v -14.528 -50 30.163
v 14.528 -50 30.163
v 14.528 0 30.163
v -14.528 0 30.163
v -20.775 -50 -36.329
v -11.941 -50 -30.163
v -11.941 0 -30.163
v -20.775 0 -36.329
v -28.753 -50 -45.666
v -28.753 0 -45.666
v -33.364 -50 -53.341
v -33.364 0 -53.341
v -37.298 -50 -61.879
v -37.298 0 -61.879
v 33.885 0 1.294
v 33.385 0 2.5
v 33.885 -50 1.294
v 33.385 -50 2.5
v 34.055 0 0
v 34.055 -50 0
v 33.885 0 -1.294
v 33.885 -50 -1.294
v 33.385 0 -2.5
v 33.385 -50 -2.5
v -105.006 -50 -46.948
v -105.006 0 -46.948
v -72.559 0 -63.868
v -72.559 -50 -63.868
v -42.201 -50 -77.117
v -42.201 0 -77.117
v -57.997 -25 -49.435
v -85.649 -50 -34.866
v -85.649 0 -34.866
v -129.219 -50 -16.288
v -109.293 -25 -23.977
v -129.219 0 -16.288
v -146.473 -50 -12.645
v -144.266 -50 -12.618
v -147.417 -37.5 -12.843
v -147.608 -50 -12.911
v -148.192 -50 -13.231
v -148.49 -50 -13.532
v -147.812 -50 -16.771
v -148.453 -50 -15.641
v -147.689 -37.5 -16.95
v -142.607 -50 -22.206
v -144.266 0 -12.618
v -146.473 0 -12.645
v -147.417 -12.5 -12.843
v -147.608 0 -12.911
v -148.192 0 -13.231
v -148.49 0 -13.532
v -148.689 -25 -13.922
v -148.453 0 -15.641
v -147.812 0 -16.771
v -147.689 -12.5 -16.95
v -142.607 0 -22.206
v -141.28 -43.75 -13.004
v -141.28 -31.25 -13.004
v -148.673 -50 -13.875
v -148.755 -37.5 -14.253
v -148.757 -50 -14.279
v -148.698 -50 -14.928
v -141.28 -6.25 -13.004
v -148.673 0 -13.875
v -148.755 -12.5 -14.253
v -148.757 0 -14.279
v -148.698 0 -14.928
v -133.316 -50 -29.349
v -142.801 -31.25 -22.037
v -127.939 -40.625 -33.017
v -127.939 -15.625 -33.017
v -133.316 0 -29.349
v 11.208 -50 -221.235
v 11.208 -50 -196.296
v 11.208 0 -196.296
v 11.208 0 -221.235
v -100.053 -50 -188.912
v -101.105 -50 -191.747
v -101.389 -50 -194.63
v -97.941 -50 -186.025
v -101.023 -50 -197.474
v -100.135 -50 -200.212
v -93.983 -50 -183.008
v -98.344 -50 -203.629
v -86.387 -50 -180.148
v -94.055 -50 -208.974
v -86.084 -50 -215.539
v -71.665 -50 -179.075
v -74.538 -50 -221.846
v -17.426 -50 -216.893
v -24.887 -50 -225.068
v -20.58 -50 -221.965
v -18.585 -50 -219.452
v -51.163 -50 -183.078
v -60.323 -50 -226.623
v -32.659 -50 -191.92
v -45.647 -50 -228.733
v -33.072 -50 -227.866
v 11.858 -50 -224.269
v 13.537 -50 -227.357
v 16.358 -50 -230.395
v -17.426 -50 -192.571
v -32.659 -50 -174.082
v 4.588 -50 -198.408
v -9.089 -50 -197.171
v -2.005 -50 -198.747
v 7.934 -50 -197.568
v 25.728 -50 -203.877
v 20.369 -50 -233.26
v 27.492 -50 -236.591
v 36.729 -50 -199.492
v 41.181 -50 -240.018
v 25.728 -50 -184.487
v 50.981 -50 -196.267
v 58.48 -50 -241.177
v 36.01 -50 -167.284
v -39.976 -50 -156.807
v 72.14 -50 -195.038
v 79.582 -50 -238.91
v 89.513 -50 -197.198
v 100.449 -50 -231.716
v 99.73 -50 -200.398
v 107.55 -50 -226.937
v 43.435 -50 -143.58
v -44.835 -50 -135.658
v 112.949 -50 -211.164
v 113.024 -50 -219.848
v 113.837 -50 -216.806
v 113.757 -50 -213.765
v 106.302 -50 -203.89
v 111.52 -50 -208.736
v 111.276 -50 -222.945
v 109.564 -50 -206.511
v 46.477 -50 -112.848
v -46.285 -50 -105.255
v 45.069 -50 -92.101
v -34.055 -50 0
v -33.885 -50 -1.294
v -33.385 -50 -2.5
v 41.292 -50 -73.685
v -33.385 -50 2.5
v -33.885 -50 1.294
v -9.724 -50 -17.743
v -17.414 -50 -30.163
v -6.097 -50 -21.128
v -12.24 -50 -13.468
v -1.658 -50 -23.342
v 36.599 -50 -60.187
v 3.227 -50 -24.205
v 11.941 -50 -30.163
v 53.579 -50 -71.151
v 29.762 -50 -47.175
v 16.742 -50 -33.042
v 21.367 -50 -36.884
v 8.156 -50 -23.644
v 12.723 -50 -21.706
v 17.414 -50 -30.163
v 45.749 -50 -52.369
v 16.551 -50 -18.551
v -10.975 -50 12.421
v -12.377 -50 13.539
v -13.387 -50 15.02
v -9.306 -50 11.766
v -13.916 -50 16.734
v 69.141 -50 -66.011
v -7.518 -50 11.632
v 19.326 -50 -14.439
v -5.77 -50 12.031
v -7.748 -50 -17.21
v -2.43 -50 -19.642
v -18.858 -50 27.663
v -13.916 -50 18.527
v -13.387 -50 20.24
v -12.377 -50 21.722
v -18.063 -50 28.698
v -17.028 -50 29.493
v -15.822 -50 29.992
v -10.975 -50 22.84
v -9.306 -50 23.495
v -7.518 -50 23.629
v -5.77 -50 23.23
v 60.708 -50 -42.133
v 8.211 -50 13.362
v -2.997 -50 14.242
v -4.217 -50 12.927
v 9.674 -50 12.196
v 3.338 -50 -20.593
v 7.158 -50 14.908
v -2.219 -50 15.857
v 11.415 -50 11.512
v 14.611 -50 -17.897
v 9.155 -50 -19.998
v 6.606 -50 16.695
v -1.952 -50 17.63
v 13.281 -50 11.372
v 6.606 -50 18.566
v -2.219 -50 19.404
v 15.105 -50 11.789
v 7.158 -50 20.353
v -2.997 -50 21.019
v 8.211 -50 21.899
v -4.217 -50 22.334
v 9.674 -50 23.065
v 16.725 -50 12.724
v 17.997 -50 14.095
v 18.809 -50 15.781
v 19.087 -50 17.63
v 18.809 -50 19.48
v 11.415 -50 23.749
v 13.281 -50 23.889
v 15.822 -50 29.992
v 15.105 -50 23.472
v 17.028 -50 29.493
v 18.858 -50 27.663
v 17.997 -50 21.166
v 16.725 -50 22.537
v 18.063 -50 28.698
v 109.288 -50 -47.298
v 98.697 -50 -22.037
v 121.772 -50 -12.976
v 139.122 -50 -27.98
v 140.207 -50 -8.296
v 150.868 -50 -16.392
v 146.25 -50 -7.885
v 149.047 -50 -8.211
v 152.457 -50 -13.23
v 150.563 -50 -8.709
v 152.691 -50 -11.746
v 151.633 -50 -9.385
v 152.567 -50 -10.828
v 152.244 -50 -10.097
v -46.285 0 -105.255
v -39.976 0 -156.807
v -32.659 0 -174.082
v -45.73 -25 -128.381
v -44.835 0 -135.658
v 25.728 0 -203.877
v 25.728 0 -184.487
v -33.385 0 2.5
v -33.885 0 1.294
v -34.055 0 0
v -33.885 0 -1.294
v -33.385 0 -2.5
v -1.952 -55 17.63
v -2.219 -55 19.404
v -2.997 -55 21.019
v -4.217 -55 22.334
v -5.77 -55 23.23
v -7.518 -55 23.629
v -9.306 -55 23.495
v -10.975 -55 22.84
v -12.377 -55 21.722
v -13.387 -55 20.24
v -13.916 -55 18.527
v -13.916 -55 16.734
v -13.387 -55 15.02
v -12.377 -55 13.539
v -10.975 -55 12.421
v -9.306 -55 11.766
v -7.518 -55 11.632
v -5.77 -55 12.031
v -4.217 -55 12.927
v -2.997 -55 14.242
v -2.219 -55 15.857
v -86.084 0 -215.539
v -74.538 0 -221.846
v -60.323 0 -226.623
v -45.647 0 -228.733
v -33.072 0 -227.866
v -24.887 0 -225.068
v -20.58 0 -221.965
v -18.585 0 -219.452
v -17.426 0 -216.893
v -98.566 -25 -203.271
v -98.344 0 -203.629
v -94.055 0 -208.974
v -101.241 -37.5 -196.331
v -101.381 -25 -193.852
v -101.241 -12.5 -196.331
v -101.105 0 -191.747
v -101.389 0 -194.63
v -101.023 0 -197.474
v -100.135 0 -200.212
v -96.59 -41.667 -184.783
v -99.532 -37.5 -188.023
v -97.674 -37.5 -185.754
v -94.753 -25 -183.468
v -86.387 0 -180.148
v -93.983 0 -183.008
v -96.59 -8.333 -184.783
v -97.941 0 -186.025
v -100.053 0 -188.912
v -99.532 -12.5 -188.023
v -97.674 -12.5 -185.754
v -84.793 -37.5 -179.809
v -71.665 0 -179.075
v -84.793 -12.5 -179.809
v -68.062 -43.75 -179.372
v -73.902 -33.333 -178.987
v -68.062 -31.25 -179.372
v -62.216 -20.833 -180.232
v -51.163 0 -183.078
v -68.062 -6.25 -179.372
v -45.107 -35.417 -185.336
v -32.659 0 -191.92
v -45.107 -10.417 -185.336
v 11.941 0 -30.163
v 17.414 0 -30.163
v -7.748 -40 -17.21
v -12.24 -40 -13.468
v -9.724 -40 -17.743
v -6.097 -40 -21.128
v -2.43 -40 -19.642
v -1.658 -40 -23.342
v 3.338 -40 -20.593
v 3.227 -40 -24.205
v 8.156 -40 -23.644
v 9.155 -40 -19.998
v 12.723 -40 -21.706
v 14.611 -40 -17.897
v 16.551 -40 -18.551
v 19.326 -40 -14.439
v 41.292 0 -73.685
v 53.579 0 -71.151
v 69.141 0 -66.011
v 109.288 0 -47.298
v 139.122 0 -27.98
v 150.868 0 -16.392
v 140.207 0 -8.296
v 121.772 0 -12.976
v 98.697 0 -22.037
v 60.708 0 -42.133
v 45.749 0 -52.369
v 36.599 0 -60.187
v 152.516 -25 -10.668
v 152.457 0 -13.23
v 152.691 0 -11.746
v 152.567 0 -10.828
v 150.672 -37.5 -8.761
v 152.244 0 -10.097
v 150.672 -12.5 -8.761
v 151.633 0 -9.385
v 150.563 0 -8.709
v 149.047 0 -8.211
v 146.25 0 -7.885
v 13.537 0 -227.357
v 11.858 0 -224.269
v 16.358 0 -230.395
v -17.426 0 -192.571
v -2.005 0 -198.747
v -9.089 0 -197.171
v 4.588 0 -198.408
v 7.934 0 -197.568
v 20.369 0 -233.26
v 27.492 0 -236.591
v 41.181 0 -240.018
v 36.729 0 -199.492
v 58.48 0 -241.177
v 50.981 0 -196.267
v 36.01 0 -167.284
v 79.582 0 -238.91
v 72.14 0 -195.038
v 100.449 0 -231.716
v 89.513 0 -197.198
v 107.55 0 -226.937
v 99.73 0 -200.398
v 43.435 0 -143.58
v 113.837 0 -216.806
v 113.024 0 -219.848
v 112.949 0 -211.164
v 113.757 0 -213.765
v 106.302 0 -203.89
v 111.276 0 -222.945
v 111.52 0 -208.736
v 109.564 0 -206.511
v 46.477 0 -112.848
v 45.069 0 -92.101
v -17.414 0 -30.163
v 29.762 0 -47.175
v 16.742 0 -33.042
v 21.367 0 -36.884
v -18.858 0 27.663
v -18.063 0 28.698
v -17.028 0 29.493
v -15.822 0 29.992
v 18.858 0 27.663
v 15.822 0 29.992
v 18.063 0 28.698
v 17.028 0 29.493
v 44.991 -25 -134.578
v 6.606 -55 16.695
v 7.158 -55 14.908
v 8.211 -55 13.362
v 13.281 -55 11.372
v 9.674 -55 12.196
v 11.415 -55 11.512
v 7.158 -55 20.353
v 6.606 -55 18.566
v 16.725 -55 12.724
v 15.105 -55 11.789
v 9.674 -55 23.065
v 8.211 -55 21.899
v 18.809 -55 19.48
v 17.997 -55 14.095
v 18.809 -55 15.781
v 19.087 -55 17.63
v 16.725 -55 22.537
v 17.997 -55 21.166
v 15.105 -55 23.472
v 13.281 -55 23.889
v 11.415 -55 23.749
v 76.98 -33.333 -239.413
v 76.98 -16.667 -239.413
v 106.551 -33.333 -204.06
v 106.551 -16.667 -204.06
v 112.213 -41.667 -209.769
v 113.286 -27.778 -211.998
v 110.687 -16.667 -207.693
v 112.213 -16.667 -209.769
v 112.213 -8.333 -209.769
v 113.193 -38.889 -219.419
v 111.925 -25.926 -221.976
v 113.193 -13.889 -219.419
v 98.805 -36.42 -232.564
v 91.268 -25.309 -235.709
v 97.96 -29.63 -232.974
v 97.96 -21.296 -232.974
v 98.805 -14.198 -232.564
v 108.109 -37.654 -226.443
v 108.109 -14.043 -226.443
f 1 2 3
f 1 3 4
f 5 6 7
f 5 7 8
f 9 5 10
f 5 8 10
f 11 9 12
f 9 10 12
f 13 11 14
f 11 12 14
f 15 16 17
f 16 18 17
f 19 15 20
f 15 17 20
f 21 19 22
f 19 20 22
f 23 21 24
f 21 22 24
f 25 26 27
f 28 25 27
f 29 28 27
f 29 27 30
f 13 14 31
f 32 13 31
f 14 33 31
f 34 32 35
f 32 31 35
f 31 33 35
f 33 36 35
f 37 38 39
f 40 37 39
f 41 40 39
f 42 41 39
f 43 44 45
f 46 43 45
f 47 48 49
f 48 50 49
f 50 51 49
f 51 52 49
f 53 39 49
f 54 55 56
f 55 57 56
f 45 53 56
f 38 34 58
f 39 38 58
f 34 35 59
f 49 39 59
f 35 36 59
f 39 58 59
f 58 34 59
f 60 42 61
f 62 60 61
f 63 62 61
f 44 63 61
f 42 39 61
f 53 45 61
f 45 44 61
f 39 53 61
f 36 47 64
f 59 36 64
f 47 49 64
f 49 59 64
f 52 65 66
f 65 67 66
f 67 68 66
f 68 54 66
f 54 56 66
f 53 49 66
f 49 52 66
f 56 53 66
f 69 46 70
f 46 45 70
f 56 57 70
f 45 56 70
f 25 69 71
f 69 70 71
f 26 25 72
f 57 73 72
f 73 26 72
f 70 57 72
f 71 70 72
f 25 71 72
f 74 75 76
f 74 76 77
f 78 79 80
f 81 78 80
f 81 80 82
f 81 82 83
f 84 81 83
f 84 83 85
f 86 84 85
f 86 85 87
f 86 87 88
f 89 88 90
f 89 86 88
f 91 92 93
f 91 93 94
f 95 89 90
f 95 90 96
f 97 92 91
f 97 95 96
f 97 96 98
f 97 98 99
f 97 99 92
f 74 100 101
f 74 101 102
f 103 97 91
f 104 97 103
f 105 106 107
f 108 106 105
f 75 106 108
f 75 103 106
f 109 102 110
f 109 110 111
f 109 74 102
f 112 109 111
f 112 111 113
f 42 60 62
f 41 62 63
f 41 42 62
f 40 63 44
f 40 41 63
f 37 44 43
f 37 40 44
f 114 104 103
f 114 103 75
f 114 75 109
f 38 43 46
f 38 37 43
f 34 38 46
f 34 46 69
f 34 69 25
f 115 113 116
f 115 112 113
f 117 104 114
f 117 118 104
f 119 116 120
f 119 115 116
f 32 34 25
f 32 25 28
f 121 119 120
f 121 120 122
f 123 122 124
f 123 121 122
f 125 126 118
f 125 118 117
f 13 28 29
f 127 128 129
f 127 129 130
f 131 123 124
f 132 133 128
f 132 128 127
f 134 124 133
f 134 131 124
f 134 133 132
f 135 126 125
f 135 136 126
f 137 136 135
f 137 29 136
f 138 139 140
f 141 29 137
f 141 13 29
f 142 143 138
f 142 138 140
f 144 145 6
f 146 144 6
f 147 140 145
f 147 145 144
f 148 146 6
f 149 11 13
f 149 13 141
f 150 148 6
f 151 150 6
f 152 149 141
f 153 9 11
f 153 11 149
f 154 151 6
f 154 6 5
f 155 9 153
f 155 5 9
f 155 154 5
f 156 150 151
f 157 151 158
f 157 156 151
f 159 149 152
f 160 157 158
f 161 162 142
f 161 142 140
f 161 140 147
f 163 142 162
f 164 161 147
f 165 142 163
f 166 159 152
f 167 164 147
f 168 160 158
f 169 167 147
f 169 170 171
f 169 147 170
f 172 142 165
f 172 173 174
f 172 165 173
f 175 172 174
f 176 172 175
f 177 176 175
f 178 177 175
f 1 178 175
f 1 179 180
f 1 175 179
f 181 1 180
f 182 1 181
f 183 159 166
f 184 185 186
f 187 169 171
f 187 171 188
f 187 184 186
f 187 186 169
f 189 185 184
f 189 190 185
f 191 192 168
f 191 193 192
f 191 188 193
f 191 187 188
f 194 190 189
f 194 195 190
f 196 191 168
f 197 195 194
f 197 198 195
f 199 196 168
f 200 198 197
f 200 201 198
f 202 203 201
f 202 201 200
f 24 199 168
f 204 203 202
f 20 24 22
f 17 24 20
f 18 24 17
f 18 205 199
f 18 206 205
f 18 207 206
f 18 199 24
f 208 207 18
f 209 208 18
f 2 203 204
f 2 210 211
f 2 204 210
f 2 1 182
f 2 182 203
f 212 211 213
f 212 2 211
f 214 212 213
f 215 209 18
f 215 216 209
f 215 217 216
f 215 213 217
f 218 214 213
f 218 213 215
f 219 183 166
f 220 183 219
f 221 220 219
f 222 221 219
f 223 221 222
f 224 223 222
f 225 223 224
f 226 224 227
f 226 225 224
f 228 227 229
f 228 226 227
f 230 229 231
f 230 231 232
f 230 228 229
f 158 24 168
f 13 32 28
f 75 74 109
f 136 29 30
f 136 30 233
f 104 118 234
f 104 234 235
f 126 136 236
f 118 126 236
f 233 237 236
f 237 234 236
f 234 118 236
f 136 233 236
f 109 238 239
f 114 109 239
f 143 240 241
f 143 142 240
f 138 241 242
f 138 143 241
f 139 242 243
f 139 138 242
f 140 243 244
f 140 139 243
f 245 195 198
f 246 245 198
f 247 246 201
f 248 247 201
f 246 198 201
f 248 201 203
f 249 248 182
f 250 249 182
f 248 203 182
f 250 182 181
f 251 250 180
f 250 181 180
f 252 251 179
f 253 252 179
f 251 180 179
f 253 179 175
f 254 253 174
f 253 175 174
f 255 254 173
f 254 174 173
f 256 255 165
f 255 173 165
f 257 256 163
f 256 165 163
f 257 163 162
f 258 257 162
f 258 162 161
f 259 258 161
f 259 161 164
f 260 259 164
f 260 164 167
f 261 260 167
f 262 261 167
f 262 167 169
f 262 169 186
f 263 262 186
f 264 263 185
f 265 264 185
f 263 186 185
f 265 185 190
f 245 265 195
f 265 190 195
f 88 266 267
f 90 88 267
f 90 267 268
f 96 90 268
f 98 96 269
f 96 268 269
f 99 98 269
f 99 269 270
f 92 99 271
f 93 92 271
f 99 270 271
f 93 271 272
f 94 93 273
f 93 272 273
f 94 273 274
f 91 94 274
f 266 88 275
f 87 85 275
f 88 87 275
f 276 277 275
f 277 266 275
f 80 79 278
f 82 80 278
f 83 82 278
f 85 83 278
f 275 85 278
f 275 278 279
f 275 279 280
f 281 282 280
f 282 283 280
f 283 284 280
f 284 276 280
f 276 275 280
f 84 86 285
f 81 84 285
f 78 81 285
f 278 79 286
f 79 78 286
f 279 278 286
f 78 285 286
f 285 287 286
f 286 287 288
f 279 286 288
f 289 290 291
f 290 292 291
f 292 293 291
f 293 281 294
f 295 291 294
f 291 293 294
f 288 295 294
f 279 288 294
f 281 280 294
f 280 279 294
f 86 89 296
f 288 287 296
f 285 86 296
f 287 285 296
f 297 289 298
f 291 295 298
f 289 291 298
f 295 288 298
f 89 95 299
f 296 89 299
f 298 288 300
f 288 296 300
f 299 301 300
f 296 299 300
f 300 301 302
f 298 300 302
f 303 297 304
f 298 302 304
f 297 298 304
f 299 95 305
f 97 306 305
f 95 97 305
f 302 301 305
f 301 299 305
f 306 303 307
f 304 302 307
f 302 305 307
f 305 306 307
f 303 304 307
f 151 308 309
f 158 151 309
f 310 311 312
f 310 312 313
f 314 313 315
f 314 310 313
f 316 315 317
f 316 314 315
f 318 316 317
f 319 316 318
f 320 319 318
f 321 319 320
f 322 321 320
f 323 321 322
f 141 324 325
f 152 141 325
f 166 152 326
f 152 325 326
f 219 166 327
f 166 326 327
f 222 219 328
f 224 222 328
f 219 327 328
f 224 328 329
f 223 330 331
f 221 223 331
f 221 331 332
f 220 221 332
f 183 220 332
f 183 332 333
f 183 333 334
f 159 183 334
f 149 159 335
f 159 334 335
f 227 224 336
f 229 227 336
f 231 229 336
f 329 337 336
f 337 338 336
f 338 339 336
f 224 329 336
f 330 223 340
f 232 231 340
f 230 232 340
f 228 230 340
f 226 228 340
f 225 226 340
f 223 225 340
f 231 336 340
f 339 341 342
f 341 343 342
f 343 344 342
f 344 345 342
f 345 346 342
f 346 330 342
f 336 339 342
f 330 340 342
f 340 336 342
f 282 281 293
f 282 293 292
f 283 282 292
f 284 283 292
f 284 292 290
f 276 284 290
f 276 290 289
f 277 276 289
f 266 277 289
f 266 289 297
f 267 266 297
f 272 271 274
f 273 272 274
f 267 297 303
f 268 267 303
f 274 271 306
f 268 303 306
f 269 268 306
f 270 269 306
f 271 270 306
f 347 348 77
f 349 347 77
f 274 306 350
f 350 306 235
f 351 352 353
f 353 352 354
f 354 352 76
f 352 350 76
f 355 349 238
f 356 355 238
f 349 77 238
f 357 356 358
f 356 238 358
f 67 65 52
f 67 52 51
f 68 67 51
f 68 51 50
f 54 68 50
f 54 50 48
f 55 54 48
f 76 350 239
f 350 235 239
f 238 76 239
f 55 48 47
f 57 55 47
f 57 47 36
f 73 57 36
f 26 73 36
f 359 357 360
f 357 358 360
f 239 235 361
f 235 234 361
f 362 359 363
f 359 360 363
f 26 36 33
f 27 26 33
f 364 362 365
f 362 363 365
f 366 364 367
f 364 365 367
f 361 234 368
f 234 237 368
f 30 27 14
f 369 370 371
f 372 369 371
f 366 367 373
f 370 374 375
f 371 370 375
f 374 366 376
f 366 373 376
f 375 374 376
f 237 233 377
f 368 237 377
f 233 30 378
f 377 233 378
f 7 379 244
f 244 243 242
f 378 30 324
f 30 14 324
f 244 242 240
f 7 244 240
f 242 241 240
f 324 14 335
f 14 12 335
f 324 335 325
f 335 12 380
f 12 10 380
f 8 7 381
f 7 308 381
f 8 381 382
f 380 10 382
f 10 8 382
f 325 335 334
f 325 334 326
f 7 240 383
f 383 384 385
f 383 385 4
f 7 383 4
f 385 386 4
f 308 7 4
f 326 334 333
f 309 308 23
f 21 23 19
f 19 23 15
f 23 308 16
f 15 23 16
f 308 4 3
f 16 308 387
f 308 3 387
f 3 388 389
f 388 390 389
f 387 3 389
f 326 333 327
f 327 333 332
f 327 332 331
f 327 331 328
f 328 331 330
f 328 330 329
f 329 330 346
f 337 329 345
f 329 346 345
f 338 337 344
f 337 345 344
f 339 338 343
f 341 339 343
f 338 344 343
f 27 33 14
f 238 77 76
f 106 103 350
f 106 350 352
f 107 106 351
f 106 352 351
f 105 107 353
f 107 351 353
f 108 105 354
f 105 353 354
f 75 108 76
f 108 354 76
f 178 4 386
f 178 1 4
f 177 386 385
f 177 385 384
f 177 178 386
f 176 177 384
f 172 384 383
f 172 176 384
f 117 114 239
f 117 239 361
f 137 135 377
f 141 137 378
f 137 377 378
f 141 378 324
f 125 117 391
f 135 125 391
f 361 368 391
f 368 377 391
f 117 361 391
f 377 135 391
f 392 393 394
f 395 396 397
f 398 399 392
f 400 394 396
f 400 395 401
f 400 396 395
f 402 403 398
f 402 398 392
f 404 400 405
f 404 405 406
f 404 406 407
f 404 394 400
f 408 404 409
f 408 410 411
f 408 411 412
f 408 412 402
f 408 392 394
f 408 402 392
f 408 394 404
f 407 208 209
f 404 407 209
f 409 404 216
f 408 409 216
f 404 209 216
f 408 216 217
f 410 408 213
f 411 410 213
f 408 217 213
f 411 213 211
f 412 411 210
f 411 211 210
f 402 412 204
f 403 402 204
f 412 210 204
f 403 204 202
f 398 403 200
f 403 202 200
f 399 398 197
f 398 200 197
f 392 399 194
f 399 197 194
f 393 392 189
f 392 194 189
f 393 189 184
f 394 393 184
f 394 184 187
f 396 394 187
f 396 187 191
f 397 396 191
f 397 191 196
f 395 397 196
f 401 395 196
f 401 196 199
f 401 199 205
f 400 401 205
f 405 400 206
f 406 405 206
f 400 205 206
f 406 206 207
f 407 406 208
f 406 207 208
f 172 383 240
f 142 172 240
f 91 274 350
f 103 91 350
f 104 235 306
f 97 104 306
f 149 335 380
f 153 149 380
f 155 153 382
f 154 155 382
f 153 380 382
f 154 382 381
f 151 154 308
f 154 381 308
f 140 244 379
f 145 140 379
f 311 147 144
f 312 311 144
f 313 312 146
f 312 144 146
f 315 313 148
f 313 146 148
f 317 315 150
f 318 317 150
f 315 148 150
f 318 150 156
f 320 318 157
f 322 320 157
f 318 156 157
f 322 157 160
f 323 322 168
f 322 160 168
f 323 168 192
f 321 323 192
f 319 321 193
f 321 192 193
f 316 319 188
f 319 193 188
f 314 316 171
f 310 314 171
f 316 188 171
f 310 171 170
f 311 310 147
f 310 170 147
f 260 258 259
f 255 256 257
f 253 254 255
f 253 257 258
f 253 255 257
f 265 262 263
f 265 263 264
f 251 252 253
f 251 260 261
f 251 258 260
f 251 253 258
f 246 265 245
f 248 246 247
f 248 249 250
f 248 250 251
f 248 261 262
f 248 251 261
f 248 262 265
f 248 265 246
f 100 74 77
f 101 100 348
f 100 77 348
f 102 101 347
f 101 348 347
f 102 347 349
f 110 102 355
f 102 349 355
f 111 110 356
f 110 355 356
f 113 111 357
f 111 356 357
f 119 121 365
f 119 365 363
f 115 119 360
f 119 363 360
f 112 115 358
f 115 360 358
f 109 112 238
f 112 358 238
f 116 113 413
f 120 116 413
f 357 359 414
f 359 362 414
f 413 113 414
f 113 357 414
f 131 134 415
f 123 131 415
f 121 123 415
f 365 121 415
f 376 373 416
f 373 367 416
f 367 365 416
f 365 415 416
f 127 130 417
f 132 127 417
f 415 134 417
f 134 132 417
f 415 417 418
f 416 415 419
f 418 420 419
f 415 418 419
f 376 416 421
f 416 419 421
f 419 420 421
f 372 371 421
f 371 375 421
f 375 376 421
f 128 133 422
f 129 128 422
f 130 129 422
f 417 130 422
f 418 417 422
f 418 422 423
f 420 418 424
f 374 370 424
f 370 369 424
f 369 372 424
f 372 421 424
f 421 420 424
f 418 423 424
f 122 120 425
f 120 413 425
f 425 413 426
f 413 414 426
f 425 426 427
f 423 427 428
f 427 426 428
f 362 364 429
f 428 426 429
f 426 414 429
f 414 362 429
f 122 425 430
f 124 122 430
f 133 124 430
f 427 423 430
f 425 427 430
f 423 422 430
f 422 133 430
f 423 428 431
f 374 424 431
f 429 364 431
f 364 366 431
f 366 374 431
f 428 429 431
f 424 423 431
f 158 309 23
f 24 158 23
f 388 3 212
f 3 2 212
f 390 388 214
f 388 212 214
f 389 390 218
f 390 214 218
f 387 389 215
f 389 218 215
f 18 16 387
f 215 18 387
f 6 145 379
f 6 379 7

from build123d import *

# Parameters (mm, degrees)
F1_DEPTH = 50
F2_R     = 6.0155907658
F2_R_2   = 6.2756136539
F3_DEPTH = 5
F4_DEPTH = 10
F5_R     = 5
F7_DEPTH = 50


with BuildPart() as f1:
    # F0 (on Front) → F1 (new body)
    with BuildSketch(Plane.XZ):
        Polygon((17.4143397291, 30.1625211911), (-17.4143397291, 30.1625211911), (-34.8286794583, 0), (-17.4143397291, -30.1625211911), (17.4143397291, -30.1625211911), (34.8286794583, 0), align=None)
    extrude(amount=F1_DEPTH)

    # F2 (on face) → F3 (join)
    with BuildSketch(Plane.XZ.offset(50)):
        with Locations((-7.967392914, 17.6304206252)):
            Circle(F2_R)
        with Locations((12.811797671, 17.6304578781)):
            Circle(F2_R_2)
    extrude(amount=F3_DEPTH)

    # F2 (on face) → F4 (cut)
    with BuildSketch(Plane.XZ.offset(50)):
        with BuildLine():
            ThreePointArc((19.3255450577, -14.4387213513), (3.3384184901, -20.5933298221), (-12.2403670102, -13.468102552))
            ThreePointArc((-12.2403670102, -13.468102552), (3.2273641474, -24.2049759369), (19.3255450577, -14.4387213513))
        make_face()
    extrude(amount=-F4_DEPTH, mode=Mode.SUBTRACT)

    # F5
    f5_edges = [f1.edges().sort_by_distance(p)[0] for p in [
        (17.41434, -25, 30.162521),
        (-17.41434, -25, 30.162521),
        (34.828679, -25, 0),
        (-34.828679, -25, 0),
    ]]
    fillet(f5_edges, radius=F5_R)

    # F6 (on Front) → F7 (join)
    with BuildSketch(Plane.XZ):
        with BuildLine():
            add(Edge.make_bspline(
                [(41.2922416881, -73.6853662735), (169.4693590378, -59.4246752204), (152.5160927466, -10.667922077), (135.5628264553, 38.0888310665), (36.5988004625, -60.1872620557)],
                knots=[0.5054493336, 0.5054493336, 0.5054493336, 3.1146139618, 3.1146139618, 5.7237785899, 5.7237785899, 5.7237785899], degree=2, weights=[1, 0.2630807094, 1, 0.2630807094, 1]))
            add(Edge.make_bspline(
                [(41.2922416881, -73.6853662735), (39.2889405165, -66.529639937), (36.5988004625, -60.1872620557)],
                knots=[5.1892655065, 5.1892655065, 5.1892655065, 5.376524204, 5.376524204, 5.376524204], degree=2, weights=[1, 0.9956199737, 1]))
        make_face()
        with BuildLine():
            add(Edge.make_bspline(
                [(-37.2982655111, -61.8791791625), (-40.1784962307, -69.0282916237), (-42.20112137, -77.1171546989)],
                knots=[0.9314728887, 0.9314728887, 0.9314728887, 1.1384572321, 1.1384572321, 1.1384572321], degree=2, weights=[1, 0.9946494634, 1]))
            add(Edge.make_bspline(
                [(-37.2982655111, -61.8791791625), (-142.2676835981, 6.0363373075), (-148.6893936246, -13.9222058565), (-155.1111036512, -33.8807490205), (-42.20112137, -77.1171546989)],
                knots=[0.9261808498, 0.9261808498, 0.9261808498, 3.1635032717, 3.1635032717, 5.4008256936, 5.4008256936, 5.4008256936], degree=2, weights=[1, 0.4368871001, 1, 0.4368871001, 1]))
        make_face()
        with BuildLine():
            add(Edge.make_bspline(
                [(36.5988004625, -60.1872620557), (22.6424707083, -27.2832810879), (0, -27.2832810879)],
                knots=[5.376524204, 5.376524204, 5.376524204, 6.2831853072, 6.2831853072, 6.2831853072], degree=2, weights=[1, 0.8989934357, 1]))
            add(Edge.make_bspline(
                [(0, -27.2832810879), (-23.3602880424, -27.2832810879), (-37.2982655111, -61.8791791625)],
                knots=[0, 0, 0, 0.9314728887, 0.9314728887, 0.9314728887], degree=2, weights=[1, 0.8934910848, 1]))
            add(Edge.make_bspline(
                [(-14.1357605669, -82.8124405083), (-11.8424071187, -78.3491930143), (-37.2982655111, -61.8791791625)],
                knots=[0, 0, 0, 0.9261808498, 0.9261808498, 0.9261808498], degree=2, weights=[1, 0.8946762325, 1]))
            add(Edge.make_bspline(
                [(-42.20112137, -77.1171546989), (-16.3047277649, -87.0336116578), (-14.1357605669, -82.8124405083)],
                knots=[5.4008256936, 5.4008256936, 5.4008256936, 6.2831853072, 6.2831853072, 6.2831853072], degree=2, weights=[1, 0.9042485074, 1]))
            add(Edge.make_bspline(
                [(-42.20112137, -77.1171546989), (-55.8693379467, -131.7789554553), (-32.6593779027, -174.0816324883)],
                knots=[1.1384572321, 1.1384572321, 1.1384572321, 2.3624206627, 2.3624206627, 2.3624206627], degree=2, weights=[1, 0.8185111489, 1]))
            Line((-32.6593779027, -174.0816324883), (-32.6593779027, -169.5833057165))
            Line((-32.6593779027, -169.5833057165), (-17.4256470054, -169.5833057165))
            Line((-17.4256470054, -169.5833057165), (-17.4256470054, -192.5705769551))
            add(Edge.make_bspline(
                [(-17.4256470054, -192.5705769551), (-3.4362621433, -203.0115231159), (11.2084979191, -196.2957137528)],
                knots=[2.7572761224, 2.7572761224, 2.7572761224, 3.3851526537, 3.3851526537, 3.3851526537], degree=2, weights=[1, 0.9511247857, 1]))
            Line((11.2084979191, -196.2957137528), (11.2084979191, -181.6708147526))
            Line((11.2084979191, -181.6708147526), (25.7280766964, -181.6708147526))
            Line((25.7280766964, -181.6708147526), (25.7280766964, -184.4870319799))
            add(Edge.make_bspline(
                [(25.7280766964, -184.4870319799), (60.4040061865, -141.9519646735), (41.2922416881, -73.6853662735)],
                knots=[3.7282237262, 3.7282237262, 3.7282237262, 5.1892655065, 5.1892655065, 5.1892655065], degree=2, weights=[1, 0.7448269354, 1]))
            add(Edge.make_bspline(
                [(30.647560719, -71.4679593328), (32.2659775962, -74.6896076408), (41.2922416881, -73.6853662735)],
                knots=[0, 0, 0, 0.5054493336, 0.5054493336, 0.5054493336], degree=2, weights=[1, 0.9682347327, 1]))
            add(Edge.make_bspline(
                [(36.5988004625, -60.1872620557), (28.8474842086, -67.884696253), (30.647560719, -71.4679593328)],
                knots=[5.7237785899, 5.7237785899, 5.7237785899, 6.2831853072, 6.2831853072, 6.2831853072], degree=2, weights=[1, 0.9611373745, 1]))
        make_face()
        with BuildLine():
            add(Edge.make_bspline(
                [(41.2922416881, -73.6853662735), (39.2889405165, -66.529639937), (36.5988004625, -60.1872620557)],
                knots=[5.1892655065, 5.1892655065, 5.1892655065, 5.376524204, 5.376524204, 5.376524204], degree=2, weights=[1, 0.9956199737, 1]))
            add(Edge.make_bspline(
                [(36.5988004625, -60.1872620557), (28.8474842086, -67.884696253), (30.647560719, -71.4679593328)],
                knots=[5.7237785899, 5.7237785899, 5.7237785899, 6.2831853072, 6.2831853072, 6.2831853072], degree=2, weights=[1, 0.9611373745, 1]))
            add(Edge.make_bspline(
                [(30.647560719, -71.4679593328), (32.2659775962, -74.6896076408), (41.2922416881, -73.6853662735)],
                knots=[0, 0, 0, 0.5054493336, 0.5054493336, 0.5054493336], degree=2, weights=[1, 0.9682347327, 1]))
        make_face()
        with BuildLine():
            add(Edge.make_bspline(
                [(-14.1357605669, -82.8124405083), (-11.8424071187, -78.3491930143), (-37.2982655111, -61.8791791625)],
                knots=[0, 0, 0, 0.9261808498, 0.9261808498, 0.9261808498], degree=2, weights=[1, 0.8946762325, 1]))
            add(Edge.make_bspline(
                [(-37.2982655111, -61.8791791625), (-40.1784962307, -69.0282916237), (-42.20112137, -77.1171546989)],
                knots=[0.9314728887, 0.9314728887, 0.9314728887, 1.1384572321, 1.1384572321, 1.1384572321], degree=2, weights=[1, 0.9946494634, 1]))
            add(Edge.make_bspline(
                [(-42.20112137, -77.1171546989), (-16.3047277649, -87.0336116578), (-14.1357605669, -82.8124405083)],
                knots=[5.4008256936, 5.4008256936, 5.4008256936, 6.2831853072, 6.2831853072, 6.2831853072], degree=2, weights=[1, 0.9042485074, 1]))
        make_face()
        with BuildLine():
            Line((-32.6593779027, -169.5833057165), (-32.6593779027, -174.0816324883))
            add(Edge.make_bspline(
                [(-32.6593779027, -174.0816324883), (-26.0445481198, -186.1378793499), (-17.4256470054, -192.5705769551)],
                knots=[2.3624206627, 2.3624206627, 2.3624206627, 2.7572761224, 2.7572761224, 2.7572761224], degree=2, weights=[1, 0.9805743661, 1]))
            Line((-17.4256470054, -192.5705769551), (-17.4256470054, -169.5833057165))
            Line((-17.4256470054, -169.5833057165), (-32.6593779027, -169.5833057165))
        make_face()
        with BuildLine():
            add(Edge.make_bspline(
                [(-32.6593779027, -174.0816324883), (-26.0445481198, -186.1378793499), (-17.4256470054, -192.5705769551)],
                knots=[2.3624206627, 2.3624206627, 2.3624206627, 2.7572761224, 2.7572761224, 2.7572761224], degree=2, weights=[1, 0.9805743661, 1]))
            Line((-32.6593779027, -174.0816324883), (-32.6593779027, -191.9202000812))
            add(Edge.make_bspline(
                [(-17.4256470054, -209.6746091398), (-19.9783918544, -200.3396941884), (-32.6593779027, -191.9202000812)],
                knots=[0.3149352399, 0.3149352399, 0.3149352399, 1.0505459948, 1.0505459948, 1.0505459948], degree=2, weights=[1, 0.9331187091, 1]))
            Line((-17.4256470054, -209.6746091398), (-17.4256470054, -192.5705769551))
        make_face()
        with BuildLine():
            add(Edge.make_bspline(
                [(-17.4256470054, -209.6746091398), (-19.9783918544, -200.3396941884), (-32.6593779027, -191.9202000812)],
                knots=[0.3149352399, 0.3149352399, 0.3149352399, 1.0505459948, 1.0505459948, 1.0505459948], degree=2, weights=[1, 0.9331187091, 1]))
            Line((-32.6593779027, -191.9202000812), (-32.6593779027, -216.8934494257))
            Line((-32.6593779027, -216.8934494257), (-17.4256470054, -216.8934494257))
            Line((-17.4256470054, -216.8934494257), (-17.4256470054, -209.6746091398))
        make_face()
        with BuildLine():
            Line((-32.6593779027, -216.8934494257), (-32.6593779027, -191.9202000812))
            add(Edge.make_bspline(
                [(-32.6593779027, -191.9202000812), (-155.0656797466, -110.6489855928), (-98.566158617, -203.2708546887), (-42.0666374873, -295.8927237846), (-17.4256470054, -216.8934494257)],
                knots=[1.0505459948, 1.0505459948, 1.0505459948, 3.666865651, 3.666865651, 6.2831853072, 6.2831853072, 6.2831853072], degree=2, weights=[1, 0.2596275414, 1, 0.2596275414, 1]))
            Line((-17.4256470054, -216.8934494257), (-32.6593779027, -216.8934494257))
        make_face()
        with BuildLine():
            add(Edge.make_bspline(
                [(11.2084979191, -196.2957137528), (19.0225466962, -192.7123391043), (25.7280766964, -184.4870319799)],
                knots=[3.3851526537, 3.3851526537, 3.3851526537, 3.7282237262, 3.7282237262, 3.7282237262], degree=2, weights=[1, 0.9853238194, 1]))
            Line((25.7280766964, -184.4870319799), (25.7280766964, -181.6708147526))
            Line((25.7280766964, -181.6708147526), (11.2084979191, -181.6708147526))
            Line((11.2084979191, -181.6708147526), (11.2084979191, -196.2957137528))
        make_face()
        with BuildLine():
            Line((25.7280766964, -203.876795604), (25.7280766964, -184.4870319799))
            add(Edge.make_bspline(
                [(11.2084979191, -196.2957137528), (19.0225466962, -192.7123391043), (25.7280766964, -184.4870319799)],
                knots=[3.3851526537, 3.3851526537, 3.3851526537, 3.7282237262, 3.7282237262, 3.7282237262], degree=2, weights=[1, 0.9853238194, 1]))
            Line((11.2084979191, -196.2957137528), (11.2084979191, -219.9759412186))
            add(Edge.make_bspline(
                [(25.7280766964, -203.876795604), (11.7578588698, -210.9900355862), (11.2084979191, -219.9759412186)],
                knots=[5.4843672103, 5.4843672103, 5.4843672103, 6.2283501589, 6.2283501589, 6.2283501589], degree=2, weights=[1, 0.9316053495, 1]))
        make_face()
        with BuildLine():
            Line((25.7280766964, -221.2353944778), (25.7280766964, -203.876795604))
            add(Edge.make_bspline(
                [(25.7280766964, -203.876795604), (11.7578588698, -210.9900355862), (11.2084979191, -219.9759412186)],
                knots=[5.4843672103, 5.4843672103, 5.4843672103, 6.2283501589, 6.2283501589, 6.2283501589], degree=2, weights=[1, 0.9316053495, 1]))
            Line((11.2084979191, -219.9759412186), (11.2084979191, -221.2353944778))
            Line((11.2084979191, -221.2353944778), (25.7280766964, -221.2353944778))
        make_face()
        with BuildLine():
            add(Edge.make_bspline(
                [(11.2084979191, -221.2353944778), (13.0350369218, -250.9322399042), (76.9798142406, -239.4129351389), (140.9245915595, -227.8936303736), (106.5507257658, -204.0600093155), (72.1768599722, -180.2263882575), (25.7280766964, -203.876795604)],
                knots=[0, 0, 0, 1.8281224034, 1.8281224034, 3.6562448069, 3.6562448069, 5.4843672103, 5.4843672103, 5.4843672103], degree=2, weights=[1, 0.610534363, 1, 0.610534363, 1, 0.610534363, 1]))
            Line((25.7280766964, -203.876795604), (25.7280766964, -221.2353944778))
            Line((25.7280766964, -221.2353944778), (11.2084979191, -221.2353944778))
        make_face()
    extrude(amount=F7_DEPTH)


solid = f1.part
